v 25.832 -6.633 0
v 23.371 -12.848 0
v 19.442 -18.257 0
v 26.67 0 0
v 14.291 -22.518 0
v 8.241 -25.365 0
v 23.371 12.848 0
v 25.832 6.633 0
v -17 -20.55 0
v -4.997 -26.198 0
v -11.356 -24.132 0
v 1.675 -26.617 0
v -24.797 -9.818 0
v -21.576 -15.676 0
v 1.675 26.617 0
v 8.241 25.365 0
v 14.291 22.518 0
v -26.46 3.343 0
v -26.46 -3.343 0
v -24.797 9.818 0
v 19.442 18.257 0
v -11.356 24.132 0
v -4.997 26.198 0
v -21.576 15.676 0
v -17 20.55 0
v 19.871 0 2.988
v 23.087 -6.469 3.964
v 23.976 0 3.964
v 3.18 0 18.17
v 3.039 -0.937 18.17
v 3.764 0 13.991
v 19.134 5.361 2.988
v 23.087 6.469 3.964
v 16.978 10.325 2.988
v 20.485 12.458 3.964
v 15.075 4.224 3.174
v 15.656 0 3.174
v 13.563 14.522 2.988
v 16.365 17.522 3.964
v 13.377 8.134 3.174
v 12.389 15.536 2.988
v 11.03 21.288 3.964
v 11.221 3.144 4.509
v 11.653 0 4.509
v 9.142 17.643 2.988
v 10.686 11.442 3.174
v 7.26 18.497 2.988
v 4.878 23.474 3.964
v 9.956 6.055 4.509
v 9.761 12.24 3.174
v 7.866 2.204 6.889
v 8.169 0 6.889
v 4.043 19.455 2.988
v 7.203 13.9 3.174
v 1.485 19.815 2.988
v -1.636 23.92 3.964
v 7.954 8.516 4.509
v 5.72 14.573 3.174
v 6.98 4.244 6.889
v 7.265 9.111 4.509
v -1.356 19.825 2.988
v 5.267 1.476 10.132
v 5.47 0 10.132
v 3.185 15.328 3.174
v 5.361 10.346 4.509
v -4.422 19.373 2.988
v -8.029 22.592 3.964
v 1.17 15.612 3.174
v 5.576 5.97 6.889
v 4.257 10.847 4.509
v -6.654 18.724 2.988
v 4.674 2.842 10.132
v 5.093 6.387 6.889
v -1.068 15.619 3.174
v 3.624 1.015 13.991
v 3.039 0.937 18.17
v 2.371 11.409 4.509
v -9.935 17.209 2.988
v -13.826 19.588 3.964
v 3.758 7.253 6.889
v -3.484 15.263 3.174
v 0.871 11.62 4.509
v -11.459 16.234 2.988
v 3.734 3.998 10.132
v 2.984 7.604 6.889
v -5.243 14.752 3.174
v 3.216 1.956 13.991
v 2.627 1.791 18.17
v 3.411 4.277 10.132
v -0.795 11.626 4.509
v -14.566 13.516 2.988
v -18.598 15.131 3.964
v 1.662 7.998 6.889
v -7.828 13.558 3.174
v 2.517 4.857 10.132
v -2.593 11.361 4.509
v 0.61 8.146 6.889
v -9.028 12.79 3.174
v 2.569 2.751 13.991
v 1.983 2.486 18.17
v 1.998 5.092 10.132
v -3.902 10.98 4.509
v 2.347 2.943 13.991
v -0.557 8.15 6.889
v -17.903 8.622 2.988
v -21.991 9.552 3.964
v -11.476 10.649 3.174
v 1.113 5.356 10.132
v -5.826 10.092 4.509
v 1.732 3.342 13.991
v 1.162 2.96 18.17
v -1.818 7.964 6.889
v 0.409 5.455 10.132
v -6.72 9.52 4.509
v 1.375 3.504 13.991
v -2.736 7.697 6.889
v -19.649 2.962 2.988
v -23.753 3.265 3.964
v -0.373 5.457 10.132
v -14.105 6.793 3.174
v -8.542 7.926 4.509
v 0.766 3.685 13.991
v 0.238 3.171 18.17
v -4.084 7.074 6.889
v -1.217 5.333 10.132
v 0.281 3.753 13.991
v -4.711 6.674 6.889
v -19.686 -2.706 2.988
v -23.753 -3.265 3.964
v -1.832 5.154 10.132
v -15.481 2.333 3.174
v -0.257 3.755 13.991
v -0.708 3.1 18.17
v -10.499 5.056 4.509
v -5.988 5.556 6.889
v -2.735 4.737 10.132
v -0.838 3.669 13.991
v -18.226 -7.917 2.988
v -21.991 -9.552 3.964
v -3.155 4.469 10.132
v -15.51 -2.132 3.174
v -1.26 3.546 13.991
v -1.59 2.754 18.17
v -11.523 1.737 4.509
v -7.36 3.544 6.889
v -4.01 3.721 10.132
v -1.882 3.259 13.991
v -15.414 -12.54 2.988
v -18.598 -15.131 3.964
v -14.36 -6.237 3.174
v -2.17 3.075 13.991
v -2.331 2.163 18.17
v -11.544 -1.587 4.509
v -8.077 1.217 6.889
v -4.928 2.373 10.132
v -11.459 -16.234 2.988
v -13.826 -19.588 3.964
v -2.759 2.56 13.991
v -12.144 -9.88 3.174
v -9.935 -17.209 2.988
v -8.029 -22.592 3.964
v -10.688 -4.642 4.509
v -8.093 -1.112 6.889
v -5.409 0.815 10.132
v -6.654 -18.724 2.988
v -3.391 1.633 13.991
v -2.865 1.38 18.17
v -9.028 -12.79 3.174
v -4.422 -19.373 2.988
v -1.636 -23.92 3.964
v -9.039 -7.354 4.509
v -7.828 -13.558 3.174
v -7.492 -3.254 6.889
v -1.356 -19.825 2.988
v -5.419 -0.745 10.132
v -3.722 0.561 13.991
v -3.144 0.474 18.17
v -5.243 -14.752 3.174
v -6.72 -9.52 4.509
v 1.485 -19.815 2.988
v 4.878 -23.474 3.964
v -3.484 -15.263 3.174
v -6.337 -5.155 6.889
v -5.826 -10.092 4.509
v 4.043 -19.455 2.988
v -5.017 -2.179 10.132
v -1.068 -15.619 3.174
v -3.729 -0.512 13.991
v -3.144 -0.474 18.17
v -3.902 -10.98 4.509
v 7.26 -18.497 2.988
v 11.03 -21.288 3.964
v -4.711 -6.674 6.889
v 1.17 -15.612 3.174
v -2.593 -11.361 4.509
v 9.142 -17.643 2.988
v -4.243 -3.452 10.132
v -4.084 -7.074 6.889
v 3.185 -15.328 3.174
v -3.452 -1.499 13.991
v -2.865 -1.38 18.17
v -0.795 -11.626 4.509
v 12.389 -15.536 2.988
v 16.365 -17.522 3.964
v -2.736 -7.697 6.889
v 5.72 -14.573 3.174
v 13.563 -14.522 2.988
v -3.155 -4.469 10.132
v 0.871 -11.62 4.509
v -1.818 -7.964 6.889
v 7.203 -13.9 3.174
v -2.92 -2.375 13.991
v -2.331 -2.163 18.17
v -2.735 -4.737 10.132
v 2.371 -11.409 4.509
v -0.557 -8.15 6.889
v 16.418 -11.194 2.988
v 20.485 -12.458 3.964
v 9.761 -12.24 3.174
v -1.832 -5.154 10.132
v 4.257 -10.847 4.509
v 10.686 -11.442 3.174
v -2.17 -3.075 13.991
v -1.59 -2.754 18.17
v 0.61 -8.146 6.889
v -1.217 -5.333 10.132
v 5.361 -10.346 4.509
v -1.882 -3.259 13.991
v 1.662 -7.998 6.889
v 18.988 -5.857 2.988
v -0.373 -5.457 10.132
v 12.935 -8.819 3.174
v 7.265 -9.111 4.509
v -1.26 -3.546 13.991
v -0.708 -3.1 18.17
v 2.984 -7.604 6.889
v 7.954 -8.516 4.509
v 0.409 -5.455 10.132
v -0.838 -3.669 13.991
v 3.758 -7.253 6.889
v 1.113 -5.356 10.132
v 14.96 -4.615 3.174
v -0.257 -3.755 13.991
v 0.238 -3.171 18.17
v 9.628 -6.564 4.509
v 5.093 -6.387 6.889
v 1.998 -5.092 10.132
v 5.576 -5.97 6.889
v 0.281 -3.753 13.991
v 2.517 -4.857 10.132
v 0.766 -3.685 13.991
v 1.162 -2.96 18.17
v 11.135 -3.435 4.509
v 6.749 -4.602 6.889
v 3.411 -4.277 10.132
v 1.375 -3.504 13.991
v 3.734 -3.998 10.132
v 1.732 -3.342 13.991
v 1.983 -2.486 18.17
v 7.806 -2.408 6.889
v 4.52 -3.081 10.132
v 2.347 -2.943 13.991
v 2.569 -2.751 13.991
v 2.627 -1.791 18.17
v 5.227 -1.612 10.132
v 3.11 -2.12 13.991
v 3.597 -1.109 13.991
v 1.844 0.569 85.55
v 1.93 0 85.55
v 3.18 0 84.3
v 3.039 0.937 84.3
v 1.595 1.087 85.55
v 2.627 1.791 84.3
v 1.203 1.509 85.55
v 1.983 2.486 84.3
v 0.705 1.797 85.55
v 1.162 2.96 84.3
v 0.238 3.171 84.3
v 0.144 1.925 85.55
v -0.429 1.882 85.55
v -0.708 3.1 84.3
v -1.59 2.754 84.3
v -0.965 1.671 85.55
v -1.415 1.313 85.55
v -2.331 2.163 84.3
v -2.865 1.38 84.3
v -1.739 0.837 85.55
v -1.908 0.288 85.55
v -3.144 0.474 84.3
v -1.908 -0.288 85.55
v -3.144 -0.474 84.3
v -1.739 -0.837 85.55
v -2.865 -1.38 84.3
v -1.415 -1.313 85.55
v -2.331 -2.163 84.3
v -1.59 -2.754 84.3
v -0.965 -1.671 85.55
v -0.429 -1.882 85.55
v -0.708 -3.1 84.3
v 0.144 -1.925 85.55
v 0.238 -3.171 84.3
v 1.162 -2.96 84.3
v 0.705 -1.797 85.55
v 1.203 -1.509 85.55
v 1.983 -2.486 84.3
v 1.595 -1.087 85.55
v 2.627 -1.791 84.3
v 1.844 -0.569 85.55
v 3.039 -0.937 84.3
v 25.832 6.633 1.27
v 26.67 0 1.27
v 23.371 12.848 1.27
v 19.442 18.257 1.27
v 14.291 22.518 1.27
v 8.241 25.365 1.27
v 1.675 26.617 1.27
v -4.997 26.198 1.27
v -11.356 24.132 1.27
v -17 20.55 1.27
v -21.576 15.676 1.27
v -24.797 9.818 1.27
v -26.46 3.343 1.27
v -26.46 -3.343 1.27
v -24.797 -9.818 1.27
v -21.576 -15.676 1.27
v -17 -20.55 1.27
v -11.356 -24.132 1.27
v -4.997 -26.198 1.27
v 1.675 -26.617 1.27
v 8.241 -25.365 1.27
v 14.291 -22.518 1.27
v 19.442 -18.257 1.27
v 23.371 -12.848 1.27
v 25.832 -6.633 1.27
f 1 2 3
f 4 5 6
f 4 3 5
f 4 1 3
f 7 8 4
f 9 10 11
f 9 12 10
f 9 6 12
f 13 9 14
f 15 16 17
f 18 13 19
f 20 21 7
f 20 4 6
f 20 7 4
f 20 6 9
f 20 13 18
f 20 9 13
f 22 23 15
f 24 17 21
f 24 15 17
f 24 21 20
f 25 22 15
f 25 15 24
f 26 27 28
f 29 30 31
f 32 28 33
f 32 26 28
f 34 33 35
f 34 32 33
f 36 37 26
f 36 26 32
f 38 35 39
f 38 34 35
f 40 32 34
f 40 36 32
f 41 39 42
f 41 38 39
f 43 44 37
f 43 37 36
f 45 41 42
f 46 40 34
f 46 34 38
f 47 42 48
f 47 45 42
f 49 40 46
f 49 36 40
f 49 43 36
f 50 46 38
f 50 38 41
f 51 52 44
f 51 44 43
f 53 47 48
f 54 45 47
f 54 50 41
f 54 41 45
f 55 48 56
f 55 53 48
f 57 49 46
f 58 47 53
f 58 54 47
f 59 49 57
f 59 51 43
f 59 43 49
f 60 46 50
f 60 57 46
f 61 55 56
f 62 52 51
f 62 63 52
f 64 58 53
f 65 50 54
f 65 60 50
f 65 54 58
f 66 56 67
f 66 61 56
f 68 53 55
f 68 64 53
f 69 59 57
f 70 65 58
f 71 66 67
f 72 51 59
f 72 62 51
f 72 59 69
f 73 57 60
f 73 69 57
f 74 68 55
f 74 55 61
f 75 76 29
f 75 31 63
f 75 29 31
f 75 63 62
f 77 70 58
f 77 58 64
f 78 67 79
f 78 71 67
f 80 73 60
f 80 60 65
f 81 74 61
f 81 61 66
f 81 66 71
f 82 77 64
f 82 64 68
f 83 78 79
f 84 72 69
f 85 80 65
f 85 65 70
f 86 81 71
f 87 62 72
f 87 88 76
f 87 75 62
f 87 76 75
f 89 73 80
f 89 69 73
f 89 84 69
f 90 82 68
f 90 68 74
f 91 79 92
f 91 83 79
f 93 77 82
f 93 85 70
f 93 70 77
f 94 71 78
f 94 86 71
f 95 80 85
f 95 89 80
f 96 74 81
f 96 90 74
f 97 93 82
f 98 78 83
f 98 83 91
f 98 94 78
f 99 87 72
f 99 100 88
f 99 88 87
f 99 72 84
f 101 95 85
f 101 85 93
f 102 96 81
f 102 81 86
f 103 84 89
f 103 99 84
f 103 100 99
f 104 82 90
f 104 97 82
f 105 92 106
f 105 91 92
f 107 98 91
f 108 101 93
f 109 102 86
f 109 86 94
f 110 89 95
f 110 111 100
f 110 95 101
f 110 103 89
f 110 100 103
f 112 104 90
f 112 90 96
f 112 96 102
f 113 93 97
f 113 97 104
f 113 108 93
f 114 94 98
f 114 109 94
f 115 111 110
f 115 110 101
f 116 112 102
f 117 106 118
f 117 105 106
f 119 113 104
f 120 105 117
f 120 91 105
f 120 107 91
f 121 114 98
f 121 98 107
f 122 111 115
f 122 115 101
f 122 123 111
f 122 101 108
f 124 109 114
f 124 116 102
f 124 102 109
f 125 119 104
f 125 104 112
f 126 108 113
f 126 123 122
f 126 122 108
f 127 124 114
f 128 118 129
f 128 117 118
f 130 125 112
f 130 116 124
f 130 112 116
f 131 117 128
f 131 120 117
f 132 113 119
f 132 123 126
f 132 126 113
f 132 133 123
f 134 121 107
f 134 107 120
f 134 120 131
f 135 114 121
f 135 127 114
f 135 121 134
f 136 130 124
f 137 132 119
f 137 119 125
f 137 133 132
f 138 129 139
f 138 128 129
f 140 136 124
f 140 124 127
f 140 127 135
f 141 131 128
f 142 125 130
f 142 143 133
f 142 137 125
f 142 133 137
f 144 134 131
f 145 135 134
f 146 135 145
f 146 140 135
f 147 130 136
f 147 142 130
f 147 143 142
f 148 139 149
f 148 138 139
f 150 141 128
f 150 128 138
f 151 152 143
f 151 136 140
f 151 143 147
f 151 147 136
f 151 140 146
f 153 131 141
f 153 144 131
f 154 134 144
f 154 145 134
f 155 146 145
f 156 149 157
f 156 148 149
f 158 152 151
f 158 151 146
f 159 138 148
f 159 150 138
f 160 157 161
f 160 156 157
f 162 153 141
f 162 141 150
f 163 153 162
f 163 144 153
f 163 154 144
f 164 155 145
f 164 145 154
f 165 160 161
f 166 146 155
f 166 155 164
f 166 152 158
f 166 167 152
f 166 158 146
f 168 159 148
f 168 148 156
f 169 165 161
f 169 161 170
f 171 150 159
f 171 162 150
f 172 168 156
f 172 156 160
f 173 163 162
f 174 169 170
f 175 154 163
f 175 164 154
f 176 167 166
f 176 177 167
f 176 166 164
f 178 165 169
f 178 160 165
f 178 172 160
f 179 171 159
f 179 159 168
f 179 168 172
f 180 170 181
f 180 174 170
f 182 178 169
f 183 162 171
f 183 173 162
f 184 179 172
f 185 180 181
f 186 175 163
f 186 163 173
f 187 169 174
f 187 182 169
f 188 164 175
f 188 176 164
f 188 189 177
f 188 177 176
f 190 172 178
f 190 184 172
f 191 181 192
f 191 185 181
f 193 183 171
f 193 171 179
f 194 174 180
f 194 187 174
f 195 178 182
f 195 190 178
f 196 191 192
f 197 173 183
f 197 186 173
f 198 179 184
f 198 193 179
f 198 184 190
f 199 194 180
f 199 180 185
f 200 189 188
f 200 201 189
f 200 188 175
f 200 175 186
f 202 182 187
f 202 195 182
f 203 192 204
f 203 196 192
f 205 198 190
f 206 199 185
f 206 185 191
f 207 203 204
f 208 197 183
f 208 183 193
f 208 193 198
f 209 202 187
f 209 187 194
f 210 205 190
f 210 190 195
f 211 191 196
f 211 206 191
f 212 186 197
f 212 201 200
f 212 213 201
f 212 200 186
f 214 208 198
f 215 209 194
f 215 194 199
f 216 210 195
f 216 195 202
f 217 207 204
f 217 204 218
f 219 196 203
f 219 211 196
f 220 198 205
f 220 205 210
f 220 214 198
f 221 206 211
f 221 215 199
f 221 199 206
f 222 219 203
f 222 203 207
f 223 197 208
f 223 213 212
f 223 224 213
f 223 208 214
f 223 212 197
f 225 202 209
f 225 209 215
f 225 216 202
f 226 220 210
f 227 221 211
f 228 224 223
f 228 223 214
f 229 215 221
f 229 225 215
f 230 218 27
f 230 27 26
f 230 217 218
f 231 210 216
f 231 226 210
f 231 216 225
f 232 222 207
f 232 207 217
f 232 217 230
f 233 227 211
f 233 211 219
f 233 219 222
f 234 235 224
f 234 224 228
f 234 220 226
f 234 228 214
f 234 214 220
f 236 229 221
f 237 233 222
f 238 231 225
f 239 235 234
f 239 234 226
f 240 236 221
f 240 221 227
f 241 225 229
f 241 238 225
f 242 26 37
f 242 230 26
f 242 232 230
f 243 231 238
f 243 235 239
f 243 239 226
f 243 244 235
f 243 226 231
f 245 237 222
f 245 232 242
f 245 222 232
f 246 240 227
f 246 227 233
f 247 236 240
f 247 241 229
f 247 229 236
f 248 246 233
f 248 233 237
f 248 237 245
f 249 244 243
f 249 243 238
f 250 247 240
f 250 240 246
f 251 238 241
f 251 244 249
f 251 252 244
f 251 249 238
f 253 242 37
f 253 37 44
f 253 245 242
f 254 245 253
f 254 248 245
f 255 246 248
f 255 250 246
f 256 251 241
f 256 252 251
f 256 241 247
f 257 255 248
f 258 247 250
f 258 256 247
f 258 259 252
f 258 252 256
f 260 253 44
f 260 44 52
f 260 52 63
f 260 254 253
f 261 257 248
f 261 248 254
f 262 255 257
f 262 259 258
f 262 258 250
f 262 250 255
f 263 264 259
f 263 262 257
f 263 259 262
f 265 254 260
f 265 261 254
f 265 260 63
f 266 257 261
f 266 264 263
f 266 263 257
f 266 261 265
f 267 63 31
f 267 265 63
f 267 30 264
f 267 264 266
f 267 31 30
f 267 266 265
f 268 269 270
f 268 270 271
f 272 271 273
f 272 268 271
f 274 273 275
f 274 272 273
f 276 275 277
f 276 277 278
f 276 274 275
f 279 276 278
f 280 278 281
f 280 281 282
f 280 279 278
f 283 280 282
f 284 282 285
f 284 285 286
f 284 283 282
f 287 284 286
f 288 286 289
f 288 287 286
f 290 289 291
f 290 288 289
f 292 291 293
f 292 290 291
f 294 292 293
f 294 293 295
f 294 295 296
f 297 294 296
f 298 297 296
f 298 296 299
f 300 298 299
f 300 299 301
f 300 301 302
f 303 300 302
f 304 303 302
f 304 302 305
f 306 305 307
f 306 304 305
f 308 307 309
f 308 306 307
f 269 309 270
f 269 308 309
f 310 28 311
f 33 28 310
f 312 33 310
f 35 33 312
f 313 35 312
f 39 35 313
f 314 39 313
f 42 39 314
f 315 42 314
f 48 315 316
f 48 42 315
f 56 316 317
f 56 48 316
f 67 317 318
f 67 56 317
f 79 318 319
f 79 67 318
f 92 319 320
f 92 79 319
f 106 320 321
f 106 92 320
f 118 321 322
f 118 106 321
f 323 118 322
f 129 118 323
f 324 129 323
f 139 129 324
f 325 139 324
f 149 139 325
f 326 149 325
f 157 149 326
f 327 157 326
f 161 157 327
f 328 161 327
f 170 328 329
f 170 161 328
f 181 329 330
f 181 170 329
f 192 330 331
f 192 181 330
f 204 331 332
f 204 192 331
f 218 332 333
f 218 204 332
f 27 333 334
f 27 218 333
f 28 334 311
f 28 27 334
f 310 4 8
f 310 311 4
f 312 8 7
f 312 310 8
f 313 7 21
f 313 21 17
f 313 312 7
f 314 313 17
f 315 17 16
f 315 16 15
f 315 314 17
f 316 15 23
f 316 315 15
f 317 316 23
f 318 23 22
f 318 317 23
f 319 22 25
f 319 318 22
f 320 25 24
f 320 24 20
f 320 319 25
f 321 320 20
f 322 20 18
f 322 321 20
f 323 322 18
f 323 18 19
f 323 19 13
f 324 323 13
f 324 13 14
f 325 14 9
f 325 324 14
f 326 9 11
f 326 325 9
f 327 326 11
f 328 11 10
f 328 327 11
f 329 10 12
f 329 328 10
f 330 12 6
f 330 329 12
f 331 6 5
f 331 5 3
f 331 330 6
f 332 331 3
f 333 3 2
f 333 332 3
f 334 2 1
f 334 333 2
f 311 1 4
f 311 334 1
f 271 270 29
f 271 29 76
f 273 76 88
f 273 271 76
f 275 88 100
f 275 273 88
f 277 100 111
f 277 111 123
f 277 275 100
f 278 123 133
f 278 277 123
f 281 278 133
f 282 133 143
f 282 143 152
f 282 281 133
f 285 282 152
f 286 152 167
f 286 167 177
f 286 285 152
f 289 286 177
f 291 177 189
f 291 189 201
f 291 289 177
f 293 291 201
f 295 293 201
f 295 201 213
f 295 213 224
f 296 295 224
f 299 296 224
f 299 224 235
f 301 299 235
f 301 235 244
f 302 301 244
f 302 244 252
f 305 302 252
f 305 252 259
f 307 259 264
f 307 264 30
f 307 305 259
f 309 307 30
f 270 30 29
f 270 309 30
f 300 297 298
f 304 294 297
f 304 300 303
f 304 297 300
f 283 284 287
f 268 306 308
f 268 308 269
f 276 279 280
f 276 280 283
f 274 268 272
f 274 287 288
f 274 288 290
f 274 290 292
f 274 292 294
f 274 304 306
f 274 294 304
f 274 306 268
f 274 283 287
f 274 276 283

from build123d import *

# Parameters (mm, degrees)
F2_SIZE = 1.25


with BuildPart() as f1:
    # F0 (on Front) → F1 (revolve)
    with BuildSketch(Plane.XZ):
        with BuildLine():
            Line((0, 85.55), (0, 0))
            Line((0, 0), (26.67, 0))
            Line((26.67, 0), (26.67, 1.27))
            Line((26.67, 1.27), (23.975923, 3.964077))
            ThreePointArc((23.975923, 3.964077), (9.828048, 5.577479), (3.18, 18.169894))
            Line((3.18, 18.169894), (3.18, 85.55))
            Line((3.18, 85.55), (0, 85.55))
        make_face()
    revolve(axis=Axis((0, 0, 42.775), (0, 0, 1)))

    # F2
    f2_edges = [f1.edges().sort_by_distance(p)[0] for p in [
        (-3.18, 0, 85.55),
    ]]
    chamfer(f2_edges, length=F2_SIZE)


solid = f1.part
